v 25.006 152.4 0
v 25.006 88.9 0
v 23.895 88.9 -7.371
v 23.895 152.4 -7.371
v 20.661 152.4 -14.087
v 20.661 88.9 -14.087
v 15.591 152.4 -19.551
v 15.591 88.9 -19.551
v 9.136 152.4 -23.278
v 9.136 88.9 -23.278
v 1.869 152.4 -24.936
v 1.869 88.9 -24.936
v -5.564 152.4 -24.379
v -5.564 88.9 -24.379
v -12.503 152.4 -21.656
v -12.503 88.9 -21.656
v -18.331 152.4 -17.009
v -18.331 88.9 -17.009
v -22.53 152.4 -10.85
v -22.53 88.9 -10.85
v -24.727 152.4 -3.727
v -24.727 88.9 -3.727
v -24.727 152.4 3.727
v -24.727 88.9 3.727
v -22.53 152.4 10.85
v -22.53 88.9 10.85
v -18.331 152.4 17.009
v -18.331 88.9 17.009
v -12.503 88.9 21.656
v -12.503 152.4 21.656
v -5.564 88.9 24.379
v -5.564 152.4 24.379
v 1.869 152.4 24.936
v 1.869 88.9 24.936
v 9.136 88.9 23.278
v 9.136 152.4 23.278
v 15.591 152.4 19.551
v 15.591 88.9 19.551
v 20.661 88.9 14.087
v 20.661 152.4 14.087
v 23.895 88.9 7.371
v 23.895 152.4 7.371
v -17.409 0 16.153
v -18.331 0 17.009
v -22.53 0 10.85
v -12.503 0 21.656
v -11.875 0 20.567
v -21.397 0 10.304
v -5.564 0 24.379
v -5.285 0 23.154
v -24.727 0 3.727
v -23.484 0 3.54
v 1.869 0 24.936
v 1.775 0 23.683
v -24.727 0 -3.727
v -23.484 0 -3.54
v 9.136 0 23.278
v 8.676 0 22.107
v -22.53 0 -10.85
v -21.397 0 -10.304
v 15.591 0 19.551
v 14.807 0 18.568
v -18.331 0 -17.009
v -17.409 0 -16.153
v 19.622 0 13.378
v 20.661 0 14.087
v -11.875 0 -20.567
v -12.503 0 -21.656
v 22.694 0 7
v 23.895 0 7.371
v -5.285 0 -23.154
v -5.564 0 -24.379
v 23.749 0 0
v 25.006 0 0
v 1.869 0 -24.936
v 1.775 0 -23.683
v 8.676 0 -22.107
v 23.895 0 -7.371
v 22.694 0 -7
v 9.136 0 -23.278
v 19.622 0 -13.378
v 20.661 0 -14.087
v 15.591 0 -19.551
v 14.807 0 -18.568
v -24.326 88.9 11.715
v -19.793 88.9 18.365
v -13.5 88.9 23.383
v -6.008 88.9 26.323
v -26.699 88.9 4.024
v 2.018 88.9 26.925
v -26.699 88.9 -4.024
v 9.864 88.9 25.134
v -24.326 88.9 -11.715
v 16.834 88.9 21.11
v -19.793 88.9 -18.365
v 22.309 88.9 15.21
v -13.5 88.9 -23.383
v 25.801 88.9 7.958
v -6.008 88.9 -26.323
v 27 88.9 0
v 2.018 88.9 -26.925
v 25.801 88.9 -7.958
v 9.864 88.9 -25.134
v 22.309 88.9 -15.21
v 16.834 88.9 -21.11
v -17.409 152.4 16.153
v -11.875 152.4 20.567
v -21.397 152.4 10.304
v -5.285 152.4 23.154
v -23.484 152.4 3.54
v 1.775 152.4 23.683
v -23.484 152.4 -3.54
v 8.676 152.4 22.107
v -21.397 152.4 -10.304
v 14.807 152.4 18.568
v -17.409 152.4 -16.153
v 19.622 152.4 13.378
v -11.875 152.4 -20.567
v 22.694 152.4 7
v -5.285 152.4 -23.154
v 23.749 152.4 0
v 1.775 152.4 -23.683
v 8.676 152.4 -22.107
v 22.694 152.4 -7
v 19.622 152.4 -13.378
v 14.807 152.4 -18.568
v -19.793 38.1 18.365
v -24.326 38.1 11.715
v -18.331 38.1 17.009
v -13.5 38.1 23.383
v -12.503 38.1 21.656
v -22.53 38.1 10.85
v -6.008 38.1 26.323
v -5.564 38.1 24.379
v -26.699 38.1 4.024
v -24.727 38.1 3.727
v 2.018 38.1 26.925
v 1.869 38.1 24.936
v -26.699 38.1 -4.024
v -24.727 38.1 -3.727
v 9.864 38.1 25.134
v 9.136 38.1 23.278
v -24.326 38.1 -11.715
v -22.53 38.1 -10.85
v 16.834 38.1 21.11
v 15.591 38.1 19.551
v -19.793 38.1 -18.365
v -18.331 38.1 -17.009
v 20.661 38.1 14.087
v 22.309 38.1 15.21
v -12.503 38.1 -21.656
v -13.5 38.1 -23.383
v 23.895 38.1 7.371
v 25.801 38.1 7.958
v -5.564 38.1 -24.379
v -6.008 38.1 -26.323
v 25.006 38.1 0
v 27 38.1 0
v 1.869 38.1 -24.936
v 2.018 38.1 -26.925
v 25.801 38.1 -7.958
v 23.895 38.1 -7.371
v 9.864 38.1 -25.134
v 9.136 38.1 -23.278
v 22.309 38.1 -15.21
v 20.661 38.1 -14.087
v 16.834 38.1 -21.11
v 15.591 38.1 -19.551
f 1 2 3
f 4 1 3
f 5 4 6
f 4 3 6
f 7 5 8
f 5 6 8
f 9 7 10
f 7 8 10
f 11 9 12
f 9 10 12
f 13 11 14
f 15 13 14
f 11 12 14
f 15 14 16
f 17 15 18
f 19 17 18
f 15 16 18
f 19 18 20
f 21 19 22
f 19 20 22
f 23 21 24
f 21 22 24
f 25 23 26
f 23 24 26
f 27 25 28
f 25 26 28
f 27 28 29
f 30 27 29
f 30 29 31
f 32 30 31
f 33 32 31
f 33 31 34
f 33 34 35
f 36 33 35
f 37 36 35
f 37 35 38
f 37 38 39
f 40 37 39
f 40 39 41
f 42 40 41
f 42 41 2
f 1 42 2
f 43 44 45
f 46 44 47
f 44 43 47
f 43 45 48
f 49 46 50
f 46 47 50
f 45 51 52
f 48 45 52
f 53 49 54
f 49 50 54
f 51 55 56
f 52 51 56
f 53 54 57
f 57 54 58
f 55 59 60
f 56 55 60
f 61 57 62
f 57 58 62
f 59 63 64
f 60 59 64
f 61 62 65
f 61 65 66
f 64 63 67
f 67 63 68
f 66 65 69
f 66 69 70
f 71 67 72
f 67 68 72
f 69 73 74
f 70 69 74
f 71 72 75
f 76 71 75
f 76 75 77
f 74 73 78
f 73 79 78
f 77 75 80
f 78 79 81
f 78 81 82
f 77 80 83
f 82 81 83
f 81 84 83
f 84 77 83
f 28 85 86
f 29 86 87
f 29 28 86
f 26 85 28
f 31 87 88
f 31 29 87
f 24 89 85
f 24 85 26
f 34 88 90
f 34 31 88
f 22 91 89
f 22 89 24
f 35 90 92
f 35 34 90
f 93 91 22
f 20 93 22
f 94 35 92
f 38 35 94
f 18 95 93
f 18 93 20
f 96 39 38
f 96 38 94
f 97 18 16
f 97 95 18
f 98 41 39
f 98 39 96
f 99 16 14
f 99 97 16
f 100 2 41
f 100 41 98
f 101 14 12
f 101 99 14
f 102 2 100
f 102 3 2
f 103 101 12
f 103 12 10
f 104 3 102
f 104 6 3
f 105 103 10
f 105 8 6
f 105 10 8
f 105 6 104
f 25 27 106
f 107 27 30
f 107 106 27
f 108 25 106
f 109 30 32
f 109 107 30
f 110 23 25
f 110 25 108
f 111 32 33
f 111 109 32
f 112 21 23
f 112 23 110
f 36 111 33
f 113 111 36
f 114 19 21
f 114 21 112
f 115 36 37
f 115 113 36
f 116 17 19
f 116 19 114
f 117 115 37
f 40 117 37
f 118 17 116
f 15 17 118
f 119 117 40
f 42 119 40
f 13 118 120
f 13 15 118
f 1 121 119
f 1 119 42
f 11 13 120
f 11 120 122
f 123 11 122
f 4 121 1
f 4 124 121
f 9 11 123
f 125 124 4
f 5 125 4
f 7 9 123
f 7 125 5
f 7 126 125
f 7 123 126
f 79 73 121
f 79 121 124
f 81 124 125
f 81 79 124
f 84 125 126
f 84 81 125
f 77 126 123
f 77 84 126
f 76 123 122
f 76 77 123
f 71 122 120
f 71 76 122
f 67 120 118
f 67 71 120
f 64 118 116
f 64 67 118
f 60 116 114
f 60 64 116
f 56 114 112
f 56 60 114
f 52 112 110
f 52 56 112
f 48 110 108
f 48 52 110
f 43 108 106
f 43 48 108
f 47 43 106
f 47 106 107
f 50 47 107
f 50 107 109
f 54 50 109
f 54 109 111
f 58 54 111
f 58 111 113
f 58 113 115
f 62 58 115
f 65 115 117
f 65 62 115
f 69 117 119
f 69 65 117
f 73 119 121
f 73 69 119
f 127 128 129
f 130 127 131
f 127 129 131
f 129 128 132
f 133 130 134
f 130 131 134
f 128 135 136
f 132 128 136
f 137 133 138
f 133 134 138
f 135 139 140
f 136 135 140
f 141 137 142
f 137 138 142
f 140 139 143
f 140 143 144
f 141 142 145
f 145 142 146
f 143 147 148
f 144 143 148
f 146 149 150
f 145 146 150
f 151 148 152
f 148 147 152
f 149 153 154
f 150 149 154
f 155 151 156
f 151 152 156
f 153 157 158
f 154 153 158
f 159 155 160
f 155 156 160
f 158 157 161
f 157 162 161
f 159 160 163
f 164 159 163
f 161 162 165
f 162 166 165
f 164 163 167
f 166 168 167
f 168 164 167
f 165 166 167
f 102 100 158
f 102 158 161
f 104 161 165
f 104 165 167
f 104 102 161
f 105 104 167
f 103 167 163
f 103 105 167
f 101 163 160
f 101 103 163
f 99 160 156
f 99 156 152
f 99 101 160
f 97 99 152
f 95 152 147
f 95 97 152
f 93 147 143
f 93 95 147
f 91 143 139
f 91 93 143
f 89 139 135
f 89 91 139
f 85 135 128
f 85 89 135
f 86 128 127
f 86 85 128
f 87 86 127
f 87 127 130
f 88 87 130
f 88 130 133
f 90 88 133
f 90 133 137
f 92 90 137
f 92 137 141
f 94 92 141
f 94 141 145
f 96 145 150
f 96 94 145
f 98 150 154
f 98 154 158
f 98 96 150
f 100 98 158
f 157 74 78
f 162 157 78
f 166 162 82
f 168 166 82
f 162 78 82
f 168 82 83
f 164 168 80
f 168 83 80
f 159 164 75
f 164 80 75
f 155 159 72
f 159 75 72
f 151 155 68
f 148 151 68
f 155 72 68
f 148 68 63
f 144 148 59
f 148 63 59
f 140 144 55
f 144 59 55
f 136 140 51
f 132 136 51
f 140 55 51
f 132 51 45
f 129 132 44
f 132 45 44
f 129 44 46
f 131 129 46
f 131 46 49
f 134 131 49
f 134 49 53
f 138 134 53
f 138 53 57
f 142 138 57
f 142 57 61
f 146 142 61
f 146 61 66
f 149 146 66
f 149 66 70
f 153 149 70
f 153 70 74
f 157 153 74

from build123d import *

# Parameters (mm, degrees)
SKETCH1_R           = 25.0063
SKETCH1_R_2         = 23.749
BOSS_EXTRUDE1_DEPTH = 152.4
SKETCH5_R           = 27.0002
SKETCH5_R_2         = 25.0063
BOSS_EXTRUDE3_DEPTH = 50.8


with BuildPart() as part:
    # Sketch1 → Boss-Extrude1 (new body)
    with BuildSketch(Plane(origin=(0, 0, 0), x_dir=(1, 0, 0), z_dir=(0, 1, 0))):
        Circle(SKETCH1_R)
        Circle(SKETCH1_R_2, mode=Mode.SUBTRACT)
    extrude(amount=BOSS_EXTRUDE1_DEPTH)

    # Sketch5 → Boss-Extrude3 (add)
    with BuildSketch(Plane(origin=(0, 88.9, 0), x_dir=(1, 0, 0), z_dir=(0, 1, 0))):
        Circle(SKETCH5_R)
        Circle(SKETCH5_R_2, mode=Mode.SUBTRACT)
    extrude(amount=-BOSS_EXTRUDE3_DEPTH)


solid = part.part
